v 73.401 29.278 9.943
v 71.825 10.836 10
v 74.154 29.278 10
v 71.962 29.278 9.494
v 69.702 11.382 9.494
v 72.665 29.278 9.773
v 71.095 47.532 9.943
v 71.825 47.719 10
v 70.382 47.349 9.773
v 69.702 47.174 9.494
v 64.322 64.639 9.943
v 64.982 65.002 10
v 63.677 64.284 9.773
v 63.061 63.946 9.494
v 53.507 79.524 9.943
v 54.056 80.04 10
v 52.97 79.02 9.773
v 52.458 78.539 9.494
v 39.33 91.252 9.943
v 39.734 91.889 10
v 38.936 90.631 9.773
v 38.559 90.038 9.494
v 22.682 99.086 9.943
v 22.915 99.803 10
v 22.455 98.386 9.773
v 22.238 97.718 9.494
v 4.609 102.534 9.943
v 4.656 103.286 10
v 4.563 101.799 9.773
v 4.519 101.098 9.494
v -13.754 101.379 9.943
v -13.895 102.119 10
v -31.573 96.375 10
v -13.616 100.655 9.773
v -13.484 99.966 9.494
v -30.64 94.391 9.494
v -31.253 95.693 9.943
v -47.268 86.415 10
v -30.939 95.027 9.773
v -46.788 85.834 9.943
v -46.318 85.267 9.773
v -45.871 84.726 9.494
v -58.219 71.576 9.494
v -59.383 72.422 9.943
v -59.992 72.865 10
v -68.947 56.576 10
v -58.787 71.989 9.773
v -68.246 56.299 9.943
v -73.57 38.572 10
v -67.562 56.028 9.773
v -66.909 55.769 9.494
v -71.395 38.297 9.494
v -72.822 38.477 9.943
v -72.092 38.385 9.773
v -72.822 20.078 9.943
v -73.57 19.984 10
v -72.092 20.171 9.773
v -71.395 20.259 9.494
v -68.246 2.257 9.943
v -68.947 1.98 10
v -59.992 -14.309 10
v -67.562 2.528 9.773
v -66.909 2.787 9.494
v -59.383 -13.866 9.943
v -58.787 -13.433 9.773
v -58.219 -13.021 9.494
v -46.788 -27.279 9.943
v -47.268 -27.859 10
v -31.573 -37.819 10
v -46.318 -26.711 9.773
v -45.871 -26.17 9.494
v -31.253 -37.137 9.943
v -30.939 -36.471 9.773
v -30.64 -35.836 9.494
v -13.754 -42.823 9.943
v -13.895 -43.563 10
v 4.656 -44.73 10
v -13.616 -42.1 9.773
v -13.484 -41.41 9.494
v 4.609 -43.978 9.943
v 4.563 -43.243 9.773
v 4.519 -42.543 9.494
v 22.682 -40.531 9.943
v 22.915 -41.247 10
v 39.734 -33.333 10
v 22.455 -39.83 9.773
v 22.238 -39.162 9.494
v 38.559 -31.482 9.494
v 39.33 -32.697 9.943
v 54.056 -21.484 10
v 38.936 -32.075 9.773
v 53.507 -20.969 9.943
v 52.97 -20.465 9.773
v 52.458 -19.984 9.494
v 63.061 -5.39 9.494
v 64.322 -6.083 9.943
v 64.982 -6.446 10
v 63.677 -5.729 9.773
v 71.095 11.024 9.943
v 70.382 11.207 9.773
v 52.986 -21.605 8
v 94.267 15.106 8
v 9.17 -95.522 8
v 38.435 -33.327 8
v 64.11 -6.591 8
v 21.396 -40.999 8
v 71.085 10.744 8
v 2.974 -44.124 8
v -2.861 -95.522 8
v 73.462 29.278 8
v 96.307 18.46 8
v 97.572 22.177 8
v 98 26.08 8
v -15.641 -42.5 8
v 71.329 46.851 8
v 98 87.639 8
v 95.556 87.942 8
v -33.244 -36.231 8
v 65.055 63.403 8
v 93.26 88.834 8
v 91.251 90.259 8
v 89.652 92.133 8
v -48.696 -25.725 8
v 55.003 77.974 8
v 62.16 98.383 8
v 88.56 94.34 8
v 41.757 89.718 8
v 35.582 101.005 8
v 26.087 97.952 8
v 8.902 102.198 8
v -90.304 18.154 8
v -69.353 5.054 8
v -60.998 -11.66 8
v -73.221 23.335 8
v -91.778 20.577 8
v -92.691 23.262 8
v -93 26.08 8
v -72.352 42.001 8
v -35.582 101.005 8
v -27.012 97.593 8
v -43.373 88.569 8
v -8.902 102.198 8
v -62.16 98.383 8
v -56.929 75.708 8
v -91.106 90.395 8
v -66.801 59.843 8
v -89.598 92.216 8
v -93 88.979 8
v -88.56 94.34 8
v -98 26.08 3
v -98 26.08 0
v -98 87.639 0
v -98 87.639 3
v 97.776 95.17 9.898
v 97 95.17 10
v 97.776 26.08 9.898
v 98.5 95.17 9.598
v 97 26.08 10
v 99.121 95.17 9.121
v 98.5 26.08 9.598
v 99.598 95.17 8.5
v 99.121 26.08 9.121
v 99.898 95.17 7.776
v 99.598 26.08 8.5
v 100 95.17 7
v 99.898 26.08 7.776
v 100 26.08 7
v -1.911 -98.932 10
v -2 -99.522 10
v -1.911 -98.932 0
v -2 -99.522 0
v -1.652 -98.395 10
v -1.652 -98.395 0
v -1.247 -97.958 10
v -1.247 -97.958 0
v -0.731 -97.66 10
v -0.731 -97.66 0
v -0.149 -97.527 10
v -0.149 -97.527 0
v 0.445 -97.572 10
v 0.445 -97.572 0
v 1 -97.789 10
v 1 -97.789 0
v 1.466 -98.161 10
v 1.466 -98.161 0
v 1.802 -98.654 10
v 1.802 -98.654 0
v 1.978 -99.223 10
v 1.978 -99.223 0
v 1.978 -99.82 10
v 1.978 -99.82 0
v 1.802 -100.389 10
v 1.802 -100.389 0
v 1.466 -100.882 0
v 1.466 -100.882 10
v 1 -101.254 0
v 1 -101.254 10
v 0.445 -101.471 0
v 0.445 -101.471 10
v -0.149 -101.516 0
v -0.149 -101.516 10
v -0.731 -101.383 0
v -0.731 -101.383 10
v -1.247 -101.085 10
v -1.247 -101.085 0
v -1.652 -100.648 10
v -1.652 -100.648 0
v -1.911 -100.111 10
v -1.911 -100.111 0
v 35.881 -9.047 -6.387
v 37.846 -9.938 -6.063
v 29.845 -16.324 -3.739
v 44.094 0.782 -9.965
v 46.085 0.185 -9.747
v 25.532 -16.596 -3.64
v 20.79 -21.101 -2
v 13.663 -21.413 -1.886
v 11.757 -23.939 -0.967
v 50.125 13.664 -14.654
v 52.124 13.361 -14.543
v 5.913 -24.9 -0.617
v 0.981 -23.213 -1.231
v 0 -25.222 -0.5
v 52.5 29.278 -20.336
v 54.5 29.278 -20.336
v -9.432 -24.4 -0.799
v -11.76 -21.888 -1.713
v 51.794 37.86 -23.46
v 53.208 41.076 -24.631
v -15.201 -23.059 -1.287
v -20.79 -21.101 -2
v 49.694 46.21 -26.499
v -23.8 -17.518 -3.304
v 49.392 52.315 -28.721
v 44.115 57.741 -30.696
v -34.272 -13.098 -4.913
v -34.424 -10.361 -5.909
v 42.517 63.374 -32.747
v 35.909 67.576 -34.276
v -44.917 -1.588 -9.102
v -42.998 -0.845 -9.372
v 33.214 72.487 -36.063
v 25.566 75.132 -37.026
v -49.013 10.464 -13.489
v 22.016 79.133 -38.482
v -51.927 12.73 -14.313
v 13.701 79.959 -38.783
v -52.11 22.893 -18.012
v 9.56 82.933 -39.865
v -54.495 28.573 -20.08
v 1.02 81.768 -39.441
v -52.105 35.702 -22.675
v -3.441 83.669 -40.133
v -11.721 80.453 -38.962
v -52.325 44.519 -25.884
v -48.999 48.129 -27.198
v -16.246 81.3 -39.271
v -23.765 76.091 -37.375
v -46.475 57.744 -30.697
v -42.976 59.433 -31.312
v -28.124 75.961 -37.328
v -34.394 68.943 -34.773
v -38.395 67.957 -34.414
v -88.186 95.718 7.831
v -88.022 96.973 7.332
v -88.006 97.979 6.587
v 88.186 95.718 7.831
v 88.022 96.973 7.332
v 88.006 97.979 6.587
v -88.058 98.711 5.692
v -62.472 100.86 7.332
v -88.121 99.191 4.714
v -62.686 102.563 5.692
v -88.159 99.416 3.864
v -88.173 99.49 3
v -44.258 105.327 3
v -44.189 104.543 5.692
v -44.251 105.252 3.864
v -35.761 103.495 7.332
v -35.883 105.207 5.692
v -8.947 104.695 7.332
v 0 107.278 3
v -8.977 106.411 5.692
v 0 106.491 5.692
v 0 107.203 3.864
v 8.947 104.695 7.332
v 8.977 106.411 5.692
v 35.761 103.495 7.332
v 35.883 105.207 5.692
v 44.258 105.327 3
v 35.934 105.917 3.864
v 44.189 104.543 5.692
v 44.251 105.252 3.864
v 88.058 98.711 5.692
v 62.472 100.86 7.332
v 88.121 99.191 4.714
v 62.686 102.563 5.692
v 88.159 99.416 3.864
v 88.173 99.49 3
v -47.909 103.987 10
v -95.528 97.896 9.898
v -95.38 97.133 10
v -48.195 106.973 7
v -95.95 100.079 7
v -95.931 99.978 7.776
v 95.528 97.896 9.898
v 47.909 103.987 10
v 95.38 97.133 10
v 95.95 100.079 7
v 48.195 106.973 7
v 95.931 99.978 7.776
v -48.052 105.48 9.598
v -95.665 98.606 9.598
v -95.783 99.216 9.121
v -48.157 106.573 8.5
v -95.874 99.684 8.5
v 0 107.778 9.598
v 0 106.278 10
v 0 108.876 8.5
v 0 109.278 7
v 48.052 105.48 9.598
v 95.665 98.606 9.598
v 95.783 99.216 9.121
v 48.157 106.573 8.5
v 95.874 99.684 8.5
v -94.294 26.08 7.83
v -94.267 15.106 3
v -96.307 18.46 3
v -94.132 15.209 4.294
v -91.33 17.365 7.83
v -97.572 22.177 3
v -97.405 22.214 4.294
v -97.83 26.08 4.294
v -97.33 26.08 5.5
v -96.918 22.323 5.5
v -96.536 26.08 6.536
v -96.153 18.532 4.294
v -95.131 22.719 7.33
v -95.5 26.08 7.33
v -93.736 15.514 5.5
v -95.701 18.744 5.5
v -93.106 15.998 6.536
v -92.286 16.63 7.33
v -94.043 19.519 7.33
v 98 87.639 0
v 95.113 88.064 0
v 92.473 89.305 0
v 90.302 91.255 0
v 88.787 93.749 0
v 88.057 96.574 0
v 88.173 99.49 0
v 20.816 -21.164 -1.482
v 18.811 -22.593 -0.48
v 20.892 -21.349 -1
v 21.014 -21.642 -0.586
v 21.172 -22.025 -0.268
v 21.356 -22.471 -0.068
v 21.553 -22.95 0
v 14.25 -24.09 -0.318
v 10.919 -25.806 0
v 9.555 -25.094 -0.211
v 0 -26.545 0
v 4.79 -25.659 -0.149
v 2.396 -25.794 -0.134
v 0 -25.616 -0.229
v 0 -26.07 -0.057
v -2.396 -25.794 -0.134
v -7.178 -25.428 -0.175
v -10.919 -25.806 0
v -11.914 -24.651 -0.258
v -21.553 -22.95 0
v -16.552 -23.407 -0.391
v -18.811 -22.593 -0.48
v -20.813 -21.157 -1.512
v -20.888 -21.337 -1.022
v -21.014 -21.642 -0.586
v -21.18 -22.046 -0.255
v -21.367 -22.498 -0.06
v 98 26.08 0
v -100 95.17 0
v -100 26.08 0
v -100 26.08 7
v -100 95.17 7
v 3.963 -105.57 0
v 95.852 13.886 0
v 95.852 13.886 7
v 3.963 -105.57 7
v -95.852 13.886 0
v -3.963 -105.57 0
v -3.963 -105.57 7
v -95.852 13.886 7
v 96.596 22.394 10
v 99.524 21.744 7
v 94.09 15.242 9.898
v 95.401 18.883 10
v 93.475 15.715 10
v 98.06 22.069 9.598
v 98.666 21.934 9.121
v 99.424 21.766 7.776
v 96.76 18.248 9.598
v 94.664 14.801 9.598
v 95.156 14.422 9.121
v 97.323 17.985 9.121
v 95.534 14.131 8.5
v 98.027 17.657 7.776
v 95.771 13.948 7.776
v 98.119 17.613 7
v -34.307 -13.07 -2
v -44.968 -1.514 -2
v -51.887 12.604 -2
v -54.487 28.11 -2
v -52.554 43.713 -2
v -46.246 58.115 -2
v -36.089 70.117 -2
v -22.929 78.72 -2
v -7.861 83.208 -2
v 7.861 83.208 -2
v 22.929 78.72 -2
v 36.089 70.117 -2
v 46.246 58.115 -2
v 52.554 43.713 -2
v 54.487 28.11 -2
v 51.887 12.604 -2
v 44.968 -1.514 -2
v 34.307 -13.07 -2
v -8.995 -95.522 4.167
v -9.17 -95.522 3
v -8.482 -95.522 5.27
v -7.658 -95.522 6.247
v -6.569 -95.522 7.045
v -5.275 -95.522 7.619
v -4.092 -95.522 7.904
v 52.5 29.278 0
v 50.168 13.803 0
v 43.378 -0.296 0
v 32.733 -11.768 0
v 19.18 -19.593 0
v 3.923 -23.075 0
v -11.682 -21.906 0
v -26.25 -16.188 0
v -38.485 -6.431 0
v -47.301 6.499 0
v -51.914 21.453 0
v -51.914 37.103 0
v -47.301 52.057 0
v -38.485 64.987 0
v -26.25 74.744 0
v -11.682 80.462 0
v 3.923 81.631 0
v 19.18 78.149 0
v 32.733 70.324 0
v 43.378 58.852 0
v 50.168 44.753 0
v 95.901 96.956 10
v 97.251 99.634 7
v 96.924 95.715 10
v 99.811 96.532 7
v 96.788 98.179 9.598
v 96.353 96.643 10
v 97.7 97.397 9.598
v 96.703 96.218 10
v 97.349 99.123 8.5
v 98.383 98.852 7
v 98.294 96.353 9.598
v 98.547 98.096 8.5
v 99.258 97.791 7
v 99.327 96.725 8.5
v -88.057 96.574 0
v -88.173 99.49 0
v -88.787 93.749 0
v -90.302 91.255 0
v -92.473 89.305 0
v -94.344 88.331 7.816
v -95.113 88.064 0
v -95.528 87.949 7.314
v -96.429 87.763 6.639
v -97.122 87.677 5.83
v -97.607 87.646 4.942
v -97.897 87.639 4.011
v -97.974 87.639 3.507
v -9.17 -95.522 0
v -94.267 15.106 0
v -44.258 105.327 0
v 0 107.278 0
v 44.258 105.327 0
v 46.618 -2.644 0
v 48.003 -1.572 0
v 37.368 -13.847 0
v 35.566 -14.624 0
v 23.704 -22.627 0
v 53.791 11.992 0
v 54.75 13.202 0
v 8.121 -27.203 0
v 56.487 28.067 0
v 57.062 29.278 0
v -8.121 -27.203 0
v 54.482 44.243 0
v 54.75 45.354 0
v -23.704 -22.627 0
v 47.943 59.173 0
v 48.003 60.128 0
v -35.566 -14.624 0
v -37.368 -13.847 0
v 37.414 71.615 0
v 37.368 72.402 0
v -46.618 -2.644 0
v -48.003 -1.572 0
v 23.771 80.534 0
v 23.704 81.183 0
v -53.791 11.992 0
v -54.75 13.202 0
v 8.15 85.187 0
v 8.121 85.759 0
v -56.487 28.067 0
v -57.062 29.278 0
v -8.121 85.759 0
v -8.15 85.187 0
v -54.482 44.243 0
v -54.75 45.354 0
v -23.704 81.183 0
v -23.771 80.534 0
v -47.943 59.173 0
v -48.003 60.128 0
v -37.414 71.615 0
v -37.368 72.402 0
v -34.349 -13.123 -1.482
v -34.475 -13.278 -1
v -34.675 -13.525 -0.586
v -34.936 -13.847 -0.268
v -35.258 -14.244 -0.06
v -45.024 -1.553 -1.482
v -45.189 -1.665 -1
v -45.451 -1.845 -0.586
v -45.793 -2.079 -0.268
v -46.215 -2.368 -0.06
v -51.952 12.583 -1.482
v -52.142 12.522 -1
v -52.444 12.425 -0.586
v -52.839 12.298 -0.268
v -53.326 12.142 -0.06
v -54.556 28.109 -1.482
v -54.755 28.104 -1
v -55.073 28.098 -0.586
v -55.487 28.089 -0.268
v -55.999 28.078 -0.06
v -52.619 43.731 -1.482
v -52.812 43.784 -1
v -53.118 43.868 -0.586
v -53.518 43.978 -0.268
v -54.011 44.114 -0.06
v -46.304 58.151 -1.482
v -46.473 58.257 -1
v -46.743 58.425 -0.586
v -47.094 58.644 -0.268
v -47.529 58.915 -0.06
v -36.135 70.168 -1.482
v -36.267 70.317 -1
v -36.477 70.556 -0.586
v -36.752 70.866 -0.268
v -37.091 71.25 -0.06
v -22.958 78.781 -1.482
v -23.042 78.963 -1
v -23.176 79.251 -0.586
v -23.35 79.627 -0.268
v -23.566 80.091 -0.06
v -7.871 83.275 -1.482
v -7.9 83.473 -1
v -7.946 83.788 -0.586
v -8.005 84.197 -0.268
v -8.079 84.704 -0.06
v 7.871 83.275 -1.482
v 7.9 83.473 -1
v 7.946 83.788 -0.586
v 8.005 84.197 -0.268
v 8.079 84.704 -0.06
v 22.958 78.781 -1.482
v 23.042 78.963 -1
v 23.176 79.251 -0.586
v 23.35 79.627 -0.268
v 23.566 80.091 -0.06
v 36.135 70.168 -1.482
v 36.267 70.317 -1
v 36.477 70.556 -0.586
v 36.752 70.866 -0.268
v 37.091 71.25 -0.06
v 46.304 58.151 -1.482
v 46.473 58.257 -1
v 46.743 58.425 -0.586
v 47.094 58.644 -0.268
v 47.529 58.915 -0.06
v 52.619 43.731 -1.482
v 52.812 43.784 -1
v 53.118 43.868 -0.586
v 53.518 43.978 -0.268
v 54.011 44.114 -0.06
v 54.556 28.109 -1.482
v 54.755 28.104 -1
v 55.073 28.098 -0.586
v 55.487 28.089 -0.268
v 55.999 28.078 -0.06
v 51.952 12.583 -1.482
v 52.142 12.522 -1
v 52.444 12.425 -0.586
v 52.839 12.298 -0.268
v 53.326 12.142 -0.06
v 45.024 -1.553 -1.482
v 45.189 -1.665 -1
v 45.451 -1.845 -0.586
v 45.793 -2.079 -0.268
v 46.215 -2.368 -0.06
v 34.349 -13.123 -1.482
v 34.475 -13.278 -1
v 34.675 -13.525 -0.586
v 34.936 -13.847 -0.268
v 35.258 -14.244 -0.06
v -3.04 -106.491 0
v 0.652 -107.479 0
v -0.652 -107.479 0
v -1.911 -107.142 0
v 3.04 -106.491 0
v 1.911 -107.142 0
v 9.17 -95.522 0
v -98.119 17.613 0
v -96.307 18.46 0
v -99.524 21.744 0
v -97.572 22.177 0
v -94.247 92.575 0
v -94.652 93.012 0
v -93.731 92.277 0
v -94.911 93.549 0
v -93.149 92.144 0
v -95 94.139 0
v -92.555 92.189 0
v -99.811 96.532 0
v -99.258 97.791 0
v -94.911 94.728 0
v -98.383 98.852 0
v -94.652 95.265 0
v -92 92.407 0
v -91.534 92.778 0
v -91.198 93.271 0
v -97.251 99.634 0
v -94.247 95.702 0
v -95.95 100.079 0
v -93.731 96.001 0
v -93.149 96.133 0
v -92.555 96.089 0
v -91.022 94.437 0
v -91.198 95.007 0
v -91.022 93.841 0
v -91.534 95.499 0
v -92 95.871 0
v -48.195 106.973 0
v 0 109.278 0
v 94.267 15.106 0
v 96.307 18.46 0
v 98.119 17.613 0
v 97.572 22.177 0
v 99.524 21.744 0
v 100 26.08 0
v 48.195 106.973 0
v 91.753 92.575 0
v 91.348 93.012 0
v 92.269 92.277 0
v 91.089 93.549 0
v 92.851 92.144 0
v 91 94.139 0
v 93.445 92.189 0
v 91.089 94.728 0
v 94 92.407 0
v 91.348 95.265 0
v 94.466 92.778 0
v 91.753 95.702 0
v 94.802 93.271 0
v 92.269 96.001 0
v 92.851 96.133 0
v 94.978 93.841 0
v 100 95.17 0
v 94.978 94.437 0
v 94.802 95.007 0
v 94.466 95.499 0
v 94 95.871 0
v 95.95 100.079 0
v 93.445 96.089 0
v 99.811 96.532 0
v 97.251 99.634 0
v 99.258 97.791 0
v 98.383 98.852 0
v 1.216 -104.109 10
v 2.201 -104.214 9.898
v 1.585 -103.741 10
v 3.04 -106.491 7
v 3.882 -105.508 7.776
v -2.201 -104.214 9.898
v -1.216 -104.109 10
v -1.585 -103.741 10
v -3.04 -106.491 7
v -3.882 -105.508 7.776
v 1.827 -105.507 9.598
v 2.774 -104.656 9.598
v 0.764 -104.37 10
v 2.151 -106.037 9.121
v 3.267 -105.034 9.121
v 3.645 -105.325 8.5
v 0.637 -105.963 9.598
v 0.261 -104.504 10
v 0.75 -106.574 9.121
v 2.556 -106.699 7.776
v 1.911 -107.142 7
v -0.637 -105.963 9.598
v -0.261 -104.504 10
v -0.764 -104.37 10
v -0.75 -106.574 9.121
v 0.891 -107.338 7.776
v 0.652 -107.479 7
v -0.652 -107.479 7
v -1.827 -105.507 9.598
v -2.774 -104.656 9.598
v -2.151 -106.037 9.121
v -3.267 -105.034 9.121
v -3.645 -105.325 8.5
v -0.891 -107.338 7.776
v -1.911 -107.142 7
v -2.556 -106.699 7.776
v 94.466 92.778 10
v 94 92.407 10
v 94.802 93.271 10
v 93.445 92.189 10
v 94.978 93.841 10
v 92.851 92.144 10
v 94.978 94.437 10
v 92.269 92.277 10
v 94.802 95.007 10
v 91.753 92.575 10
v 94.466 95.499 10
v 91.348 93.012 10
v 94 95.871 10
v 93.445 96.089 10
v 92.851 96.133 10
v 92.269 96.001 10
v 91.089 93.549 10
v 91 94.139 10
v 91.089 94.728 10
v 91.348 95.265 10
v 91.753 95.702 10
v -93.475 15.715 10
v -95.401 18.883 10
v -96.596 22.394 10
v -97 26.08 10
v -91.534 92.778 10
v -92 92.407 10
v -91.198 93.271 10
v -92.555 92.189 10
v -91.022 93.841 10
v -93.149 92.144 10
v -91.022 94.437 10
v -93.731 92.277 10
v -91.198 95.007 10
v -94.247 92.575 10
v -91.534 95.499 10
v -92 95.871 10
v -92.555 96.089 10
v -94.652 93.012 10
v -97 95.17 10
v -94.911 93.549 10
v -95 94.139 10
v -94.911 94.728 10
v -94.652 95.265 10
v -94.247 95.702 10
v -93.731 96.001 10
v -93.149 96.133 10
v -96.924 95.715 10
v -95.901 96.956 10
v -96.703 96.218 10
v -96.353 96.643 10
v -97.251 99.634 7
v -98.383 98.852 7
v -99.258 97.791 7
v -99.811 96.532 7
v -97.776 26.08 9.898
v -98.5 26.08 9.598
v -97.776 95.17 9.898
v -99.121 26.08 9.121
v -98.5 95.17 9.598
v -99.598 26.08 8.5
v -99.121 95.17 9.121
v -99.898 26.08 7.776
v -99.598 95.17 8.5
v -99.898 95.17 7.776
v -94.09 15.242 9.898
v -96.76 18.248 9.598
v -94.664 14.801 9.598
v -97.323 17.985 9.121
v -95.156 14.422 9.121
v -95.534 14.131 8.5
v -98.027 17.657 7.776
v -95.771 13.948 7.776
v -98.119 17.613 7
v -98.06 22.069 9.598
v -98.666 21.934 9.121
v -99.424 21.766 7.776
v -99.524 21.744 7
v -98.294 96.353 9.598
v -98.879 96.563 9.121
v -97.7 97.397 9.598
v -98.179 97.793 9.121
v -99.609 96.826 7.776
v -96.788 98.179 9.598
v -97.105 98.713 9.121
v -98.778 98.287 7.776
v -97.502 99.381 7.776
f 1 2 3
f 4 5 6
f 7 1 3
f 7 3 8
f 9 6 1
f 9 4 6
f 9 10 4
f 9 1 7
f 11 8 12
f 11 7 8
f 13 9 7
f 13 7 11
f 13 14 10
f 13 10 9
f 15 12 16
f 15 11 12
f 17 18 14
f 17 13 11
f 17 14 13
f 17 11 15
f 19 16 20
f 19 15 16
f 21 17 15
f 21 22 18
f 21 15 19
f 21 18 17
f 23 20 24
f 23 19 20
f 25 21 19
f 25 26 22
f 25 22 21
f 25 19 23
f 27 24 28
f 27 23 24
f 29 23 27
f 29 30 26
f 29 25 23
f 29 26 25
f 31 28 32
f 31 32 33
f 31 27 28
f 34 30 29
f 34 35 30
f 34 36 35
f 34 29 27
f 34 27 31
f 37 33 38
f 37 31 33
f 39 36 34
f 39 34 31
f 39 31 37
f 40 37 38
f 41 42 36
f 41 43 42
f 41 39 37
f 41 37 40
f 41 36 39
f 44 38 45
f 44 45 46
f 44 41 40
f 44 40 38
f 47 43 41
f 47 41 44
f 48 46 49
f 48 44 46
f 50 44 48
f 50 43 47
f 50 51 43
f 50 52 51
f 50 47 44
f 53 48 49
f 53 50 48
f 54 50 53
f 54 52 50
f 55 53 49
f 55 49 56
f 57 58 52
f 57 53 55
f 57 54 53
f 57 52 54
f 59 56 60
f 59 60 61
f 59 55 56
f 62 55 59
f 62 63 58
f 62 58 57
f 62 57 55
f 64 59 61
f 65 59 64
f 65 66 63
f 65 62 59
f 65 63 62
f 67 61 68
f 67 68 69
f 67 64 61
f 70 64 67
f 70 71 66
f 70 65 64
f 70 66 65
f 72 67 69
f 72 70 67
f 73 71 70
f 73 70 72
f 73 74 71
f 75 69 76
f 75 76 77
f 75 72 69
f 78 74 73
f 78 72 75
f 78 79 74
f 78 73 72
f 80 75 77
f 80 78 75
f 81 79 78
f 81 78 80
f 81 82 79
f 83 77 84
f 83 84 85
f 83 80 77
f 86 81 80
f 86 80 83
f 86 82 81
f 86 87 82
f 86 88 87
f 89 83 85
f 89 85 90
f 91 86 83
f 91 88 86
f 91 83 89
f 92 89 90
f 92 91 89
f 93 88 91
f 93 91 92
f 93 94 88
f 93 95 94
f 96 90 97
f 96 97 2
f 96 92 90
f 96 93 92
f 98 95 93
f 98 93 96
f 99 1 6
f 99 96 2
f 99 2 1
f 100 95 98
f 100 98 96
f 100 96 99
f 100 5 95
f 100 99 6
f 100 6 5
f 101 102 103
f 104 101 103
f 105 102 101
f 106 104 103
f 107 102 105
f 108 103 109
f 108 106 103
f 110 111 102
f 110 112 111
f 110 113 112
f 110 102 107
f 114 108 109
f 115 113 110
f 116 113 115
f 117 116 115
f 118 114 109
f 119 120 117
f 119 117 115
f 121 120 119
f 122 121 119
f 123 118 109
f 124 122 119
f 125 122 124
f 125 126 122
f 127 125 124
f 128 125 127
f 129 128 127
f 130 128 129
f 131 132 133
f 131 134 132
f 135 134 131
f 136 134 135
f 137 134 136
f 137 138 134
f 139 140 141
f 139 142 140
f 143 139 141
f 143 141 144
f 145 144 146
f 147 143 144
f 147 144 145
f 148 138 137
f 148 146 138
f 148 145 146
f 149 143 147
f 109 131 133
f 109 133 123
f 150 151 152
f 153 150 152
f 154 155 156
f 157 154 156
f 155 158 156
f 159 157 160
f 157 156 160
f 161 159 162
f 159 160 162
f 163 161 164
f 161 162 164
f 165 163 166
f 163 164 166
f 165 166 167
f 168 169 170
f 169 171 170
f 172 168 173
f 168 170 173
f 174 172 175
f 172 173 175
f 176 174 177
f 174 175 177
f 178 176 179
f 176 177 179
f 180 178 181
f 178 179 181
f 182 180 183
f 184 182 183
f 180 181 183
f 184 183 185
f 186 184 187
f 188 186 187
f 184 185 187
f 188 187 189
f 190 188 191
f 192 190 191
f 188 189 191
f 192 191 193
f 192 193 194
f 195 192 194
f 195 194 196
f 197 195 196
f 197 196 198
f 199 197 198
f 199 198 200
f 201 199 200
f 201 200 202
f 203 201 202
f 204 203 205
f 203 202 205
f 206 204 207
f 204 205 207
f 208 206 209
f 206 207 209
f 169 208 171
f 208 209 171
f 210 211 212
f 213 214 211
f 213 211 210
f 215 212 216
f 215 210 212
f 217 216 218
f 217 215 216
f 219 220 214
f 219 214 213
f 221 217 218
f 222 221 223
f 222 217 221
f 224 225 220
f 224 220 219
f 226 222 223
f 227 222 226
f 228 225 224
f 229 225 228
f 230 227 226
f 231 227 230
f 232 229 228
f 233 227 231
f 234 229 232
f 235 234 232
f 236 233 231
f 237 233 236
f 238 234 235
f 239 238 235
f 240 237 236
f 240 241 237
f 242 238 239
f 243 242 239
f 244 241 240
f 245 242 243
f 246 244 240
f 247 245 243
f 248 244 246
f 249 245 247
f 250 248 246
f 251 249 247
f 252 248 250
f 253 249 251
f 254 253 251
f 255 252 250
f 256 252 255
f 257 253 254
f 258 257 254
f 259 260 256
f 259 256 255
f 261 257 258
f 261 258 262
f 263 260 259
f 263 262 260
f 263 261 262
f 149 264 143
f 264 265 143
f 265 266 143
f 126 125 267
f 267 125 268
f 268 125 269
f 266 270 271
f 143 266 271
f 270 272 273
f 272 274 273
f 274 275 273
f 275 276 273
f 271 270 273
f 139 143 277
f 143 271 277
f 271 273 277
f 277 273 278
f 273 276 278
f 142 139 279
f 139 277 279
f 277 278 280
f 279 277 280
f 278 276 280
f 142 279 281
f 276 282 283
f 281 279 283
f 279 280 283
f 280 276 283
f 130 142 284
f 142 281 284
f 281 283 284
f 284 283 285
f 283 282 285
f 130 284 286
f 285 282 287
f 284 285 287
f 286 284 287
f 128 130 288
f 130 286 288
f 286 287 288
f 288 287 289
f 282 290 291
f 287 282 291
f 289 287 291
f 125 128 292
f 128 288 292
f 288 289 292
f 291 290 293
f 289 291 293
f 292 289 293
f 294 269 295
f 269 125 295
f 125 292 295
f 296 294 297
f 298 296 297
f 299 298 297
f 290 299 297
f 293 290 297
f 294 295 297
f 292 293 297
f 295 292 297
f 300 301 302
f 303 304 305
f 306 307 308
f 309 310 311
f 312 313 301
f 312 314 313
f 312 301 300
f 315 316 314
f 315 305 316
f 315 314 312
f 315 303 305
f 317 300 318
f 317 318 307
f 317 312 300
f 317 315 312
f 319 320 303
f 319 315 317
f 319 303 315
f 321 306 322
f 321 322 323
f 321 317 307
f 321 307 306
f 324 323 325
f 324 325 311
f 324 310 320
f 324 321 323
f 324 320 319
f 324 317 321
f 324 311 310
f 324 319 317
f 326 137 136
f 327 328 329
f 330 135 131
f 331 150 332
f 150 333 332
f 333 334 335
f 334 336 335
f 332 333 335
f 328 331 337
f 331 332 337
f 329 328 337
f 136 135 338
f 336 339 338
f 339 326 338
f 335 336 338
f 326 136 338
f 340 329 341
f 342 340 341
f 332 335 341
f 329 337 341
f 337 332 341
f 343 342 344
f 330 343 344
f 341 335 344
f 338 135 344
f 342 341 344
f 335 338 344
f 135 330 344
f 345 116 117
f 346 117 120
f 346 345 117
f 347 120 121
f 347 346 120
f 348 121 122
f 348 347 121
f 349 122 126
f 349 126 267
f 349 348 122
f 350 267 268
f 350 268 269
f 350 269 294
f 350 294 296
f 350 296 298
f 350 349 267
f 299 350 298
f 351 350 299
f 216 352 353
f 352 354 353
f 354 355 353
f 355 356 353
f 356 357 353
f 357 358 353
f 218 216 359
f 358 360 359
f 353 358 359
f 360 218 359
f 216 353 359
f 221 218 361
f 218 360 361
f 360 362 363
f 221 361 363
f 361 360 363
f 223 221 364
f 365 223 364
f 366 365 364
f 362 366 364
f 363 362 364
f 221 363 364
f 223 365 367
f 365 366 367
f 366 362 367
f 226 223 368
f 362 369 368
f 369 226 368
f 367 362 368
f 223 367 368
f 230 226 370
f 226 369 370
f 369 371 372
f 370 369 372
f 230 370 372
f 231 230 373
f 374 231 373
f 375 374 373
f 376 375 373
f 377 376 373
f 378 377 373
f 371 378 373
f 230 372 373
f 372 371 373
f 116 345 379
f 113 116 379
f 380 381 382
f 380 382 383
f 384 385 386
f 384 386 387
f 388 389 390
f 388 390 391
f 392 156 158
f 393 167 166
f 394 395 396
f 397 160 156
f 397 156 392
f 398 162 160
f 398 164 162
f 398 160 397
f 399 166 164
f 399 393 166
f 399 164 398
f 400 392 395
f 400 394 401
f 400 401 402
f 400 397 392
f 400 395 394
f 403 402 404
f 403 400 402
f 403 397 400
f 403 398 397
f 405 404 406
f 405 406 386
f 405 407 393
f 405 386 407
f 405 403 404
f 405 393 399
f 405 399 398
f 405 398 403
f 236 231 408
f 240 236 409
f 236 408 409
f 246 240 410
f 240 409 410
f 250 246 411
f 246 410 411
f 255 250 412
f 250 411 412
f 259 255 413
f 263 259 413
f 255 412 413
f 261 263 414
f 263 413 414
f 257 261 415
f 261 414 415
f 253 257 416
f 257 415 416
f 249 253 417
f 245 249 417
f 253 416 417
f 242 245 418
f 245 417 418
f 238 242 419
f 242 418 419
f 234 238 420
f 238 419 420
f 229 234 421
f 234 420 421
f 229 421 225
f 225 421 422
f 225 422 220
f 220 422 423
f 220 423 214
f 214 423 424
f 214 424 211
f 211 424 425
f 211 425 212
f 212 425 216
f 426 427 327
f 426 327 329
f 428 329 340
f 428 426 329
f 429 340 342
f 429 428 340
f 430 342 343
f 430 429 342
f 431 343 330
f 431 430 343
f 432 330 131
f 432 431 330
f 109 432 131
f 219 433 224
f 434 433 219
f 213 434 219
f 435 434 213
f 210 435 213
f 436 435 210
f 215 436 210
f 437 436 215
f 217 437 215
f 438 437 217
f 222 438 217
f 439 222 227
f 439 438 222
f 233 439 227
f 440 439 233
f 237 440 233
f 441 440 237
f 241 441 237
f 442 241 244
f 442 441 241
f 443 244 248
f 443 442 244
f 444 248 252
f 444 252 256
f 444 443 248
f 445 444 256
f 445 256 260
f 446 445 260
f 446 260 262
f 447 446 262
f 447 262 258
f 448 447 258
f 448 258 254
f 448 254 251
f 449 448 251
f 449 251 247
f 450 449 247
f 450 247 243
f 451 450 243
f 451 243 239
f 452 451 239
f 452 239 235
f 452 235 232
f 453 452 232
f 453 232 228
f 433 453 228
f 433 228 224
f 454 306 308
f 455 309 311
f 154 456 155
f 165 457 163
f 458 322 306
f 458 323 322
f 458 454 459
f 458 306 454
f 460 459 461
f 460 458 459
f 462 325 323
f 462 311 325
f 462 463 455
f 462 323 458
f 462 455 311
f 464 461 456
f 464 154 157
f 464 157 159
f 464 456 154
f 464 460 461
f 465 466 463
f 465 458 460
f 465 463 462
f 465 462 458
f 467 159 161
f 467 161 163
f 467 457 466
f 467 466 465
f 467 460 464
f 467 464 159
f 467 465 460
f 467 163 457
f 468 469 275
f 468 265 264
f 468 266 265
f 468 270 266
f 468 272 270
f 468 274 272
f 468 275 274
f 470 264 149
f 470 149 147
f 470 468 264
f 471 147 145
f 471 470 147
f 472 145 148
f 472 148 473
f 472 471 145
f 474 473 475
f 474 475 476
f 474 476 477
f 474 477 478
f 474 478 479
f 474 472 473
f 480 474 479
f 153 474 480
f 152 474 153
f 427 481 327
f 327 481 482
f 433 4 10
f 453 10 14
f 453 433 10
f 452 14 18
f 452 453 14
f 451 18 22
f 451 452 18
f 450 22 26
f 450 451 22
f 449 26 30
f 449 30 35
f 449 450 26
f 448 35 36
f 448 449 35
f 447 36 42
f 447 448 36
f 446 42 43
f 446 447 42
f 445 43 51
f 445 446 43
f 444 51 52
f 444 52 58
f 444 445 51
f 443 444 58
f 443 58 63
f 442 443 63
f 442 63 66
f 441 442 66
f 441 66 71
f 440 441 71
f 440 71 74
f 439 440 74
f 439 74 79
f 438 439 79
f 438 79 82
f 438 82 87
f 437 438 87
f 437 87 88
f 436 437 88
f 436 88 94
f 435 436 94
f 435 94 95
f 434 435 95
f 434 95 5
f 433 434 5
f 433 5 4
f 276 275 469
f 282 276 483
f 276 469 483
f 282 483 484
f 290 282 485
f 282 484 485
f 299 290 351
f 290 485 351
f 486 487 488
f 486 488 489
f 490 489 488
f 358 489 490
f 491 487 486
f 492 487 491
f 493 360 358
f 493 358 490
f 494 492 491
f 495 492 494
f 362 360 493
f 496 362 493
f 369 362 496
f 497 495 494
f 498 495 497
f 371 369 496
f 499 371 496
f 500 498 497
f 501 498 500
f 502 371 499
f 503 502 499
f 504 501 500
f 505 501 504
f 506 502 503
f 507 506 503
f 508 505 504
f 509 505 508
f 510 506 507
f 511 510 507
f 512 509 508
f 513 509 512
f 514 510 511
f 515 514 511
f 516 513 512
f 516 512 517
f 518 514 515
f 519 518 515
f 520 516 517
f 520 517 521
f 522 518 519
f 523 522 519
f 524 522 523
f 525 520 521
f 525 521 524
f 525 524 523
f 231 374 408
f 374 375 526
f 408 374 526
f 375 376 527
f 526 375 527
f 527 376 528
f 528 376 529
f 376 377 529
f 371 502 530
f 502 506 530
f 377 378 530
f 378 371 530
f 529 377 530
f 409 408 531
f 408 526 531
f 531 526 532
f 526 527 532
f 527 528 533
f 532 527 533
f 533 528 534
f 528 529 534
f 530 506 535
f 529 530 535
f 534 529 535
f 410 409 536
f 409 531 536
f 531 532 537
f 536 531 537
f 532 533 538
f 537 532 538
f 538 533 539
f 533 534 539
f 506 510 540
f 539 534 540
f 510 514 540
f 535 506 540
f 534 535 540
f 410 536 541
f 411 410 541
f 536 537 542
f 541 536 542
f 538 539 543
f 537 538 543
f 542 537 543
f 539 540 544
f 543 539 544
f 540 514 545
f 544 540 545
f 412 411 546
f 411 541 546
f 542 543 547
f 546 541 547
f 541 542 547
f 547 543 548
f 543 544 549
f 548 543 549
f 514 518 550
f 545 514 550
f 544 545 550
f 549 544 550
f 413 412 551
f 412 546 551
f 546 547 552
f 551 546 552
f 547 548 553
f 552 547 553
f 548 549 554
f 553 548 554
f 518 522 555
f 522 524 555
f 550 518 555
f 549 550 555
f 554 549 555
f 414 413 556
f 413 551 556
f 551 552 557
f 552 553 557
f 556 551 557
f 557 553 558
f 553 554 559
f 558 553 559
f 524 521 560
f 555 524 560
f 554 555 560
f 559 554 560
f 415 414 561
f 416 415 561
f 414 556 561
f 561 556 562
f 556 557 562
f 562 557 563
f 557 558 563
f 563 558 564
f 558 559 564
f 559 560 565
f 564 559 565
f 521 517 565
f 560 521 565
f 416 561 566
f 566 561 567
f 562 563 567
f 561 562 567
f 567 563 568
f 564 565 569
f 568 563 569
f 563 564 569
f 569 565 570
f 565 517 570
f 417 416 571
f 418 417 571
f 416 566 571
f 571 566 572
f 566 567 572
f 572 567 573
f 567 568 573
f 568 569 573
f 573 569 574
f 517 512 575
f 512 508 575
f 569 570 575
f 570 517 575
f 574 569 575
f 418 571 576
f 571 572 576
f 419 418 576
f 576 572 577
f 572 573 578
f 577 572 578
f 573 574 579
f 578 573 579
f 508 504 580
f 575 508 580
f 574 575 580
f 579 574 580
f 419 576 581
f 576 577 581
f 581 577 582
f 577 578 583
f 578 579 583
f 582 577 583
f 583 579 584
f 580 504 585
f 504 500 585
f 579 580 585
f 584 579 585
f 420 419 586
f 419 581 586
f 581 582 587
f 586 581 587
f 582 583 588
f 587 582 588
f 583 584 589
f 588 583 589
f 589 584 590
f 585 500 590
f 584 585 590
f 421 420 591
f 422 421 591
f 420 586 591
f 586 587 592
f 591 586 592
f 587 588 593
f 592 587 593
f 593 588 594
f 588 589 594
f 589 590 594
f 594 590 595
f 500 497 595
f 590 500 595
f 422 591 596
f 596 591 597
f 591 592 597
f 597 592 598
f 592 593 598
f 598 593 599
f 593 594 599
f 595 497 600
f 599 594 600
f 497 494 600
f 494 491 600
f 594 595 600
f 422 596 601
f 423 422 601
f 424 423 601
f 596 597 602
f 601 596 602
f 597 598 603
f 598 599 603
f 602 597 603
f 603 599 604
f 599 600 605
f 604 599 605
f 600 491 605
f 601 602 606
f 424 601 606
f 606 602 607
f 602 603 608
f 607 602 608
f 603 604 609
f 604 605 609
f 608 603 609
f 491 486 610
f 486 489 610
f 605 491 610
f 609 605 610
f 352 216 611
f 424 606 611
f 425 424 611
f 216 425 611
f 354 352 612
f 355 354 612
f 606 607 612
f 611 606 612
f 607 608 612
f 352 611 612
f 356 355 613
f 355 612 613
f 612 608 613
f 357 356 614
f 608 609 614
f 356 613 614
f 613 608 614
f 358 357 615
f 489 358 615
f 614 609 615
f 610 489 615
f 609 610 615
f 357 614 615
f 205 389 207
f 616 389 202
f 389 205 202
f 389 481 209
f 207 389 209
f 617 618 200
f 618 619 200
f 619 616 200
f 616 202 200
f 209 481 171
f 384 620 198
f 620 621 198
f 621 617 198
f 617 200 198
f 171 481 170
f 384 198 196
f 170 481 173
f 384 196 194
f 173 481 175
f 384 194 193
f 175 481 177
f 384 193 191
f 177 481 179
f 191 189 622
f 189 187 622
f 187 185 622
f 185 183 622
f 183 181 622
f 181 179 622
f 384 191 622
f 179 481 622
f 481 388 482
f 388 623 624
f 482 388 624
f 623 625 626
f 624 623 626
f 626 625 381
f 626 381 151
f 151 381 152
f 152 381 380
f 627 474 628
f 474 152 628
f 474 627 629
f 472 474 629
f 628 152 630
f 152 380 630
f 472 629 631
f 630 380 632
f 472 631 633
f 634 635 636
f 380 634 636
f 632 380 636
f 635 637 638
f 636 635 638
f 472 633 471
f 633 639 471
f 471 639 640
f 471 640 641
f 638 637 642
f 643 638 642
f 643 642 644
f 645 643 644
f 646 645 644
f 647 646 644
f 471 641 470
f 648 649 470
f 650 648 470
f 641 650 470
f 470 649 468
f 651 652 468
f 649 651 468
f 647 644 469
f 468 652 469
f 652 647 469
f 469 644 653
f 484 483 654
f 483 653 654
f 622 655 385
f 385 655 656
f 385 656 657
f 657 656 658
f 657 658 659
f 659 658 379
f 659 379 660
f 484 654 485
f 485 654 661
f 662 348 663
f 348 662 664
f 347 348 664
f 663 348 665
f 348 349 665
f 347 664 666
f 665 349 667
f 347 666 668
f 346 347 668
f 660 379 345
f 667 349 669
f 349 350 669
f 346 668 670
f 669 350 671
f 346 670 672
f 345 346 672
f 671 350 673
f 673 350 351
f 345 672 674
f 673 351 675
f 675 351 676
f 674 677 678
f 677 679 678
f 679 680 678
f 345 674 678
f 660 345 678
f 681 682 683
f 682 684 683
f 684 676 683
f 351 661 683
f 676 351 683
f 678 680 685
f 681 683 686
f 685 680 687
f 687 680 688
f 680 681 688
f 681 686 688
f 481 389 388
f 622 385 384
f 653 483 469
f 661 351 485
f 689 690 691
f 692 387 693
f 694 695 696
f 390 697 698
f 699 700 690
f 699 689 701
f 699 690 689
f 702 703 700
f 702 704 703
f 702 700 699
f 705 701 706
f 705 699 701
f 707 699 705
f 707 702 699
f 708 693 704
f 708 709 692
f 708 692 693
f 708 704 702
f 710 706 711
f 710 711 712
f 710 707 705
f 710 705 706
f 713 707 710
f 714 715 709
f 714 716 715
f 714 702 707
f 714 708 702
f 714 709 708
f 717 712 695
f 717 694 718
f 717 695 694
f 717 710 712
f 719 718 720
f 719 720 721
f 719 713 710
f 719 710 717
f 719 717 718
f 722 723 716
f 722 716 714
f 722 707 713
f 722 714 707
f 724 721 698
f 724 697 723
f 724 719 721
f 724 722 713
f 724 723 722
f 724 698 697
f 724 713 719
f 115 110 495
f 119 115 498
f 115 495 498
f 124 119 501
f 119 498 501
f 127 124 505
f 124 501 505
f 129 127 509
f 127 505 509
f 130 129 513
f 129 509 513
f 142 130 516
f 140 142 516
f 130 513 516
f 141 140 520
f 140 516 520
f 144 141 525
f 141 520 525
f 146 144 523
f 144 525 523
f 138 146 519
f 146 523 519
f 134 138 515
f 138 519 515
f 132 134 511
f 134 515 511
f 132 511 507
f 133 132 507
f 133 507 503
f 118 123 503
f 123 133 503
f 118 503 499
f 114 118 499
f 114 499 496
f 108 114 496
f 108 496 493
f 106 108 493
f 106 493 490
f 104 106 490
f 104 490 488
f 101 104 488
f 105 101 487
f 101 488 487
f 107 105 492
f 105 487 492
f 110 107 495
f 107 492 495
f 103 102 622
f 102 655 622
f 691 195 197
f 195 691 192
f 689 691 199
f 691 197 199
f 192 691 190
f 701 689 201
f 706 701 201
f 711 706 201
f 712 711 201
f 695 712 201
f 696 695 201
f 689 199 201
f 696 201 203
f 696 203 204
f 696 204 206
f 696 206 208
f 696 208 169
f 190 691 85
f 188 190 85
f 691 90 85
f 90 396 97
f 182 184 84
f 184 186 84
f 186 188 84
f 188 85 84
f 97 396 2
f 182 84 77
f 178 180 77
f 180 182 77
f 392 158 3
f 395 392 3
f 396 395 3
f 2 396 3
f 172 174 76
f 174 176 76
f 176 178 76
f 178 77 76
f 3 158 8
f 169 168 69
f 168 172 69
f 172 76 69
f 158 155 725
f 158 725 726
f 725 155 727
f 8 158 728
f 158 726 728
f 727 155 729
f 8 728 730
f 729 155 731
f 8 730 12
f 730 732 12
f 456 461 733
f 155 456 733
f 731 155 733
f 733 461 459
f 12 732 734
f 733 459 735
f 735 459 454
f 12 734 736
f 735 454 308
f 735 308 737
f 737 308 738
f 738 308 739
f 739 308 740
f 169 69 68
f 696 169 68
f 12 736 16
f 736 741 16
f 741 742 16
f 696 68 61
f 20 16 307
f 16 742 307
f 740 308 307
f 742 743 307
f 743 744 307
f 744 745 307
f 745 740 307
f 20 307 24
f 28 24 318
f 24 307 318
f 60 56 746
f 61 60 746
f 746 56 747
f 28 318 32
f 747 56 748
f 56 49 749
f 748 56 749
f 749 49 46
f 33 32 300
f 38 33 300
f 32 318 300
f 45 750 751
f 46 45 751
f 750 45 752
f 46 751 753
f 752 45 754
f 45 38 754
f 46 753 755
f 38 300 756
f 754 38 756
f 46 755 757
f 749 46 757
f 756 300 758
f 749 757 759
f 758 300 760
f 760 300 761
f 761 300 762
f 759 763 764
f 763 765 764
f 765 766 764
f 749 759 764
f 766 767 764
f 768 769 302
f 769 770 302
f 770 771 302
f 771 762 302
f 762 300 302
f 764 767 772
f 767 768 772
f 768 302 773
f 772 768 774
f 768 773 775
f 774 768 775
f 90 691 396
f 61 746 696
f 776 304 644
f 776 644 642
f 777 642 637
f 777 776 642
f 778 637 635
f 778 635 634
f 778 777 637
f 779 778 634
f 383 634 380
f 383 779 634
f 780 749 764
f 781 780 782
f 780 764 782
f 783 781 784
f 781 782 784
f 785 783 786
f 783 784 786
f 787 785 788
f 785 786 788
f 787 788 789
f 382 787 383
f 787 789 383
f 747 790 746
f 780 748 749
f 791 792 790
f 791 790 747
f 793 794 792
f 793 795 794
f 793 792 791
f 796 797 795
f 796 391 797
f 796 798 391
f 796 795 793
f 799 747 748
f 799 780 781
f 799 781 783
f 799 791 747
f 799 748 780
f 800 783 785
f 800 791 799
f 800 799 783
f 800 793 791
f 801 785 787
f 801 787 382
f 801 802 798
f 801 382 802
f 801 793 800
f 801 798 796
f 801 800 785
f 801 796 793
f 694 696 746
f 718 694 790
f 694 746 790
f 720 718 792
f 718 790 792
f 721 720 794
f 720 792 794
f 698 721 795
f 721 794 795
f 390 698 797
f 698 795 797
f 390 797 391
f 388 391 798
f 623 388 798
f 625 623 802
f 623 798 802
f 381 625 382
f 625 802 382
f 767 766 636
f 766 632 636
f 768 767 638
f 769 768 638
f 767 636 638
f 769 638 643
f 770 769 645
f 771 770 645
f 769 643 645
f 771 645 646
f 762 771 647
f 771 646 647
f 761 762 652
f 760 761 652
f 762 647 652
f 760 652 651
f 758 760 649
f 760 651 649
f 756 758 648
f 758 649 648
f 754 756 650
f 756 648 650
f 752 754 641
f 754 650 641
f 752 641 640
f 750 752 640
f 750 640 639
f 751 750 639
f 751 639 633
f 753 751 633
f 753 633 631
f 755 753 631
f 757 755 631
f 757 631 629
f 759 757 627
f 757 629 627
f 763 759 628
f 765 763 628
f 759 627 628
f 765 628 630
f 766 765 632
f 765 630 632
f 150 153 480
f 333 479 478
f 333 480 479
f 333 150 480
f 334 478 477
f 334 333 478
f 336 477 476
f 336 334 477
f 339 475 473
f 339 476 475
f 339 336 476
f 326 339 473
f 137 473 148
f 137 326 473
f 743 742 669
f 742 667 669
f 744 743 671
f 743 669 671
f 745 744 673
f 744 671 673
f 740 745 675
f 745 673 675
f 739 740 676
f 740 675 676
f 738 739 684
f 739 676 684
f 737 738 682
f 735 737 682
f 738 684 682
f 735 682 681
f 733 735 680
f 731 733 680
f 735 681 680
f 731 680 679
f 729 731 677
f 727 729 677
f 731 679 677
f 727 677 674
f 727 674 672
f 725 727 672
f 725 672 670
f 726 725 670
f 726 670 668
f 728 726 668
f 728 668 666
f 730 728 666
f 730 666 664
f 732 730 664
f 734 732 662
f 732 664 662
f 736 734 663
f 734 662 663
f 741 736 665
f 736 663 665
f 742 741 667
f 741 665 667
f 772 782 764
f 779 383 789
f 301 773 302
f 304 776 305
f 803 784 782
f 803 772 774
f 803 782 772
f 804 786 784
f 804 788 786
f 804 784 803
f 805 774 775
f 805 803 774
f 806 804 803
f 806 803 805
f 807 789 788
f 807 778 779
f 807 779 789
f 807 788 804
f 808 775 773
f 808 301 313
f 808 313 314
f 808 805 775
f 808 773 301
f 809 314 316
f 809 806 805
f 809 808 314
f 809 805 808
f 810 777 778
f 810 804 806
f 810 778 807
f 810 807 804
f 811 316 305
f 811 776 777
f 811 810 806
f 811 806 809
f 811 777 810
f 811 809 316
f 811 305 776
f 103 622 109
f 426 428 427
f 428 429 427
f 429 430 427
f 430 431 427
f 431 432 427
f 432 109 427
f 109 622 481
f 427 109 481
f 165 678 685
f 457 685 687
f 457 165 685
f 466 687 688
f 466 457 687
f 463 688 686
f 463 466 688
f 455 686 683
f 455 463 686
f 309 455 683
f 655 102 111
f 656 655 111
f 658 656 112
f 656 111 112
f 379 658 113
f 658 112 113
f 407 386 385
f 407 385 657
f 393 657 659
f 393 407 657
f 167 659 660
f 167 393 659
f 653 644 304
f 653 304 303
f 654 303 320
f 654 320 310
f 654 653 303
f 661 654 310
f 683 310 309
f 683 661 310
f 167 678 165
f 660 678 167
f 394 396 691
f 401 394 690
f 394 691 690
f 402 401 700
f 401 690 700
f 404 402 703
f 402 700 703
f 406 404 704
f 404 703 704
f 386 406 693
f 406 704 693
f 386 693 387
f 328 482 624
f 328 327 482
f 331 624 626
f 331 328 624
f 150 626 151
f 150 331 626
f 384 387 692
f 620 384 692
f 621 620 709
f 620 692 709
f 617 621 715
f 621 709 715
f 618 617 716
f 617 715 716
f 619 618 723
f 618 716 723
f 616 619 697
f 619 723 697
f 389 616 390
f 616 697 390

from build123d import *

# Parameters (mm, degrees)
BOSS_EXTRUDE1_DEPTH = 10
SKETCH3_R           = 73
SKETCH2_R           = 52.5
FILLET3_R           = 5
FILLET4_R           = 20
SHELL4_T            = -2
BOSS_EXTRUDE3_START = 8
BOSS_EXTRUDE3_DEPTH = 8
SKETCH16_R          = 2
CUT_EXTRUDE8_DEPTH  = 9
SKETCH5_R           = 54.5
SKETCH5_R_2         = 52.5
BOSS_EXTRUDE2_DEPTH = 60
SKETCH9_R           = 112.367107934
CUT_EXTRUDE5_DEPTH  = 60
SKETCH10_R          = 91.913425111
CUT_EXTRUDE6_DEPTH  = 10
SKETCH11_R          = 79.181330982
CUT_EXTRUDE7_DEPTH  = 10
FILLET5_R           = 5
FILLET6_R           = 5
FILLET7_R           = 3
FILLET8_R           = 5
FILLET9_R           = 2
FILLET10_R          = 5


with BuildPart() as part:
    # Sketch1 → Boss-Extrude1 (new body)
    with BuildSketch(Plane.XY):
        with BuildLine():
            Line((100, 99.277863028), (100, 19.277863028))
            Line((100, 19.277863028), (0, -110.722136972))
            Line((0, -110.722136972), (-100, 19.277863028))
            Line((-100, 19.277863028), (-100, 99.277863028))
            ThreePointArc((-100, 99.277863028), (0, 109.277863028), (100, 99.277863028))
        make_face()
    extrude(amount=BOSS_EXTRUDE1_DEPTH)

    # Sketch3 → Cut-Loft1 section 0
    with BuildSketch(Plane.XY.offset(10)):
        with Locations((0, 29.277863028)):
            Circle(SKETCH3_R)
    # Sketch2 → Cut-Loft1 section 1
    with BuildSketch(Plane.XY):
        with Locations((0, 29.277863028)):
            Circle(SKETCH2_R)
    loft(mode=Mode.SUBTRACT)

    # Fillet3
    fillet3_edges = [part.edges().sort_by_distance(p)[0] for p in [
        (0, -110.722136972, 5),
    ]]
    fillet(fillet3_edges, radius=FILLET3_R)

    # Fillet4
    fillet4_edges = [part.edges().sort_by_distance(p)[0] for p in [
        (100, 19.277863028, 5),
        (-100, 19.277863028, 5),
    ]]
    fillet(fillet4_edges, radius=FILLET4_R)

    # Shell4
    shell4_openings = [part.faces().sort_by_distance(p)[0] for p in [
        (47.569868433, -44.043588356, 0),
    ]]
    offset(amount=SHELL4_T, openings=shell4_openings, kind=Kind.INTERSECTION)

    # Sketch12 → Boss-Extrude3 (add)
    with BuildSketch(Plane(origin=(0, 0, 8), x_dir=(-1, 0, 0), z_dir=(0, 0, -1)).offset(BOSS_EXTRUDE3_START)):
        with BuildLine():
            Line((-9.169512185, -95.521527238), (9.169512185, -95.521527238))
            Line((9.169512185, -95.521527238), (2.377871967, -104.350659521))
            ThreePointArc((2.377871967, -104.350659521), (0, -105.521527238), (-2.377871967, -104.350659521))
            Line((-2.377871967, -104.350659521), (-9.169512185, -95.521527238))
        make_face()
        with BuildLine():
            Line((98, 87.63878568), (98, 97.63878568))
            ThreePointArc((98, 97.63878568), (93.090974034, 98.588565475), (88.172749454, 99.48950087))
            ThreePointArc((88.172749454, 99.48950087), (90.302365562, 91.255493109), (98, 87.63878568))
        make_face()
        with BuildLine():
            Line((-98, 97.63878568), (-98, 87.63878568))
            ThreePointArc((-98, 87.63878568), (-90.302365562, 91.255493109), (-88.172749454, 99.48950087))
            ThreePointArc((-88.172749454, 99.48950087), (-93.090974034, 98.588565475), (-98, 97.63878568))
        make_face()
    extrude(amount=-BOSS_EXTRUDE3_DEPTH)

    # Sketch16 → Cut-Extrude8 (cut, symmetric)
    with BuildSketch(Plane(origin=(0, 0, 8), x_dir=(-1, 0, 0), z_dir=(0, 0, -1))):
        with Locations((0, -99.521527238)):
            Circle(SKETCH16_R)
        with Locations((-93, 94.13878568)):
            Circle(SKETCH16_R)
        with Locations((93, 94.13878568)):
            Circle(SKETCH16_R)
    extrude(amount=CUT_EXTRUDE8_DEPTH, both=True, mode=Mode.SUBTRACT)

    # Sketch5 → Boss-Extrude2 (add)
    with BuildSketch(Plane(origin=(0, 0, 0), x_dir=(-1, 0, 0), z_dir=(0, 0, -1))):
        with Locations(Location((0, 29.277863028, 0), (0, 0, 180))):
            Circle(SKETCH5_R)
        with Locations(Location((0, 29.277863028, 0), (0, 0, 180))):
            Circle(SKETCH5_R_2, mode=Mode.SUBTRACT)
    extrude(amount=BOSS_EXTRUDE2_DEPTH)

    # Sketch9 → Cut-Extrude5 (cut)
    with BuildSketch(Plane(origin=(0, -4.696341029, -10.071335838), x_dir=(-1, 0, 0), z_dir=(0, -0.42261826174070327, -0.9063077870366482))):
        with Locations((0, 89.719397921)):
            Circle(SKETCH9_R)
    extrude(amount=CUT_EXTRUDE5_DEPTH, mode=Mode.SUBTRACT)

    # Sketch10 → Cut-Extrude6 (cut)
    with BuildSketch(Plane(origin=(0, -4.030519152, -9.495308079), x_dir=(-1, 0, 0), z_dir=(0, -0.39073112848928093, -0.9205048534524374))):
        with Locations((0, 68.891691178)):
            Circle(SKETCH10_R)
    extrude(amount=CUT_EXTRUDE6_DEPTH, mode=Mode.SUBTRACT)

    # Sketch11 → Cut-Extrude7 (cut)
    with BuildSketch(Plane(origin=(0, -3.111126453, -8.547749678), x_dir=(-1, 0, 0), z_dir=(0, -0.34202014332567576, -0.9396926207859059))):
        with Locations((0, 55.651285061)):
            Circle(SKETCH11_R)
    extrude(amount=CUT_EXTRUDE7_DEPTH, mode=Mode.SUBTRACT)

    # Fillet5
    fillet5_edges = [part.edges().sort_by_distance(p)[0] for p in [
        (100, 99.277863028, 5),
    ]]
    fillet(fillet5_edges, radius=FILLET5_R)

    # Fillet6
    fillet6_edges = [part.edges().sort_by_distance(p)[0] for p in [
        (-100, 99.277863028, 5),
    ]]
    fillet(fillet6_edges, radius=FILLET6_R)

    # Fillet7
    fillet7_edges = [part.edges().sort_by_distance(p)[0] for p in [
        (0, 109.277863028, 10),
        (98.856812155, 98.351888702, 10),
        (-100, 60.625105075, 10),
        (-98.856812155, 98.351888702, 10),
        (49.907799864, -45.841997149, 10),
        (0, -107.521527238, 10),
        (100, 60.625105075, 10),
        (-49.907799864, -45.841997149, 10),
        (-98.934751063, 19.640177571, 10),
        (98.934751063, 19.640177571, 10),
    ]]
    fillet(fillet7_edges, radius=FILLET7_R)

    # Fillet8
    fillet8_edges = [part.edges().sort_by_distance(p)[0] for p in [
        (-73, 29.277863028, 10),
    ]]
    fillet(fillet8_edges, radius=FILLET8_R)

    # Fillet9
    fillet9_edges = [part.edges().sort_by_distance(p)[0] for p in [
        (-54.5, 29.277863028, 0),
    ]]
    fillet(fillet9_edges, radius=FILLET9_R)

    # Fillet10
    # the kernel refuses this fillet: 5 mm, written as the material it adds along each edge
    with BuildSketch(Plane(origin=(-80, 26.080301962, 8), x_dir=(-1, 0, 0), z_dir=(0, 1, 0))) as fillet10_piece_1:
        with BuildLine():
            CenterArc((18 - FILLET10_R, -FILLET10_R), FILLET10_R, 0, 90)
            Line((18, -FILLET10_R), (18 + FILLET10_R * 0.02, -FILLET10_R))
            Line((18 + FILLET10_R * 0.02, -FILLET10_R), (18 + FILLET10_R * 0.02, FILLET10_R * 0.02))
            Line((18 + FILLET10_R * 0.02, FILLET10_R * 0.02), (18 - FILLET10_R, FILLET10_R * 0.02))
            Line((18 - FILLET10_R, FILLET10_R * 0.02), (18 - FILLET10_R, 0))
        make_face()
    revolve(axis=Axis((-80, 26.080301962, 8), (0, 0, 1)), revolution_arc=37.568592029)
    with BuildSketch(Plane(origin=(-1.548127674, -105.429327102, 8), x_dir=(0.7926239891046, 0.6097107608496924, 0), z_dir=(-0.6097107608496926, 0.7926239891046001, 0))) as fillet10_piece_2_section:
        with BuildLine():
            CenterArc((FILLET10_R, FILLET10_R), FILLET10_R, 180, 90)
            Line((0, FILLET10_R), (-FILLET10_R * 0.02, FILLET10_R))
            Line((-FILLET10_R * 0.02, FILLET10_R), (-FILLET10_R * 0.02, -FILLET10_R * 0.02))
            Line((-FILLET10_R * 0.02, -FILLET10_R * 0.02), (FILLET10_R, -FILLET10_R * 0.02))
            Line((FILLET10_R, -FILLET10_R * 0.02), (FILLET10_R, 0))
        make_face()
    fillet10_piece_2 = extrude(amount=152.07063756, mode=Mode.PRIVATE)
    fillet10_piece_2 = split(fillet10_piece_2, bisect_by=Plane(origin=(-50.54915131, -95.521527238, 6.871784101), z_dir=(0, 1, 0)), keep=Keep.TOP, mode=Mode.PRIVATE)
    add(fillet10_piece_2)
    with BuildSketch(Plane(origin=(-98, 26.080301962, 8), x_dir=(1, 0, 0), z_dir=(0, 1, 0))) as fillet10_piece_3_section:
        with BuildLine():
            CenterArc((FILLET10_R, FILLET10_R), FILLET10_R, 180, 90)
            Line((0, FILLET10_R), (-FILLET10_R * 0.02, FILLET10_R))
            Line((-FILLET10_R * 0.02, FILLET10_R), (-FILLET10_R * 0.02, -FILLET10_R * 0.02))
            Line((-FILLET10_R * 0.02, -FILLET10_R * 0.02), (FILLET10_R, -FILLET10_R * 0.02))
            Line((FILLET10_R, -FILLET10_R * 0.02), (FILLET10_R, 0))
        make_face()
    fillet10_piece_3 = extrude(amount=74.058483718, mode=Mode.PRIVATE)
    fillet10_piece_3 = fillet10_piece_3 - Plane(origin=(-98, 97.63878568, 6.86971186), x_dir=(0.9827250545662549, 0.18507151895348808, 0), z_dir=(0, 0, -1)) * Cylinder(10, 169, mode=Mode.PRIVATE)
    add(fillet10_piece_3)
    with BuildSketch(Plane(origin=(0, -395.722136972, 8), x_dir=(-0.19970369332898327, 0.9798563337912163, 0), z_dir=(-0.9798563337912163, -0.19970369332898327, 0))) as fillet10_piece_4_section:
        with BuildLine():
            CenterArc((503 - FILLET10_R, FILLET10_R), FILLET10_R, 270, 90)
            Line((503, FILLET10_R), (503 + FILLET10_R * 0.02, FILLET10_R))
            Line((503 + FILLET10_R * 0.02, FILLET10_R), (503 + FILLET10_R * 0.02, -FILLET10_R * 0.02))
            Line((503 + FILLET10_R * 0.02, -FILLET10_R * 0.02), (503 - FILLET10_R, -FILLET10_R * 0.02))
            Line((503 - FILLET10_R, -FILLET10_R * 0.02), (503 - FILLET10_R, 0))
        make_face()
    fillet10_piece_4 = revolve(axis=Axis((0, -395.722136972, 8), (0, 0, -1)), revolution_arc=23.03926473, mode=Mode.PRIVATE)
    fillet10_piece_4 = fillet10_piece_4 - Plane(origin=(-98, 97.63878568, 6.609161961), x_dir=(0.9827250545662549, 0.18507151895348808, 0), z_dir=(0, 0, -1)) * Cylinder(10, 2013, mode=Mode.PRIVATE)
    fillet10_piece_4 = fillet10_piece_4 - Plane(origin=(98, 97.63878568, 6.609161961), x_dir=(0, -1, 0), z_dir=(0, 0, -1)) * Cylinder(10, 2013, mode=Mode.PRIVATE)
    add(fillet10_piece_4)


solid = part.part
